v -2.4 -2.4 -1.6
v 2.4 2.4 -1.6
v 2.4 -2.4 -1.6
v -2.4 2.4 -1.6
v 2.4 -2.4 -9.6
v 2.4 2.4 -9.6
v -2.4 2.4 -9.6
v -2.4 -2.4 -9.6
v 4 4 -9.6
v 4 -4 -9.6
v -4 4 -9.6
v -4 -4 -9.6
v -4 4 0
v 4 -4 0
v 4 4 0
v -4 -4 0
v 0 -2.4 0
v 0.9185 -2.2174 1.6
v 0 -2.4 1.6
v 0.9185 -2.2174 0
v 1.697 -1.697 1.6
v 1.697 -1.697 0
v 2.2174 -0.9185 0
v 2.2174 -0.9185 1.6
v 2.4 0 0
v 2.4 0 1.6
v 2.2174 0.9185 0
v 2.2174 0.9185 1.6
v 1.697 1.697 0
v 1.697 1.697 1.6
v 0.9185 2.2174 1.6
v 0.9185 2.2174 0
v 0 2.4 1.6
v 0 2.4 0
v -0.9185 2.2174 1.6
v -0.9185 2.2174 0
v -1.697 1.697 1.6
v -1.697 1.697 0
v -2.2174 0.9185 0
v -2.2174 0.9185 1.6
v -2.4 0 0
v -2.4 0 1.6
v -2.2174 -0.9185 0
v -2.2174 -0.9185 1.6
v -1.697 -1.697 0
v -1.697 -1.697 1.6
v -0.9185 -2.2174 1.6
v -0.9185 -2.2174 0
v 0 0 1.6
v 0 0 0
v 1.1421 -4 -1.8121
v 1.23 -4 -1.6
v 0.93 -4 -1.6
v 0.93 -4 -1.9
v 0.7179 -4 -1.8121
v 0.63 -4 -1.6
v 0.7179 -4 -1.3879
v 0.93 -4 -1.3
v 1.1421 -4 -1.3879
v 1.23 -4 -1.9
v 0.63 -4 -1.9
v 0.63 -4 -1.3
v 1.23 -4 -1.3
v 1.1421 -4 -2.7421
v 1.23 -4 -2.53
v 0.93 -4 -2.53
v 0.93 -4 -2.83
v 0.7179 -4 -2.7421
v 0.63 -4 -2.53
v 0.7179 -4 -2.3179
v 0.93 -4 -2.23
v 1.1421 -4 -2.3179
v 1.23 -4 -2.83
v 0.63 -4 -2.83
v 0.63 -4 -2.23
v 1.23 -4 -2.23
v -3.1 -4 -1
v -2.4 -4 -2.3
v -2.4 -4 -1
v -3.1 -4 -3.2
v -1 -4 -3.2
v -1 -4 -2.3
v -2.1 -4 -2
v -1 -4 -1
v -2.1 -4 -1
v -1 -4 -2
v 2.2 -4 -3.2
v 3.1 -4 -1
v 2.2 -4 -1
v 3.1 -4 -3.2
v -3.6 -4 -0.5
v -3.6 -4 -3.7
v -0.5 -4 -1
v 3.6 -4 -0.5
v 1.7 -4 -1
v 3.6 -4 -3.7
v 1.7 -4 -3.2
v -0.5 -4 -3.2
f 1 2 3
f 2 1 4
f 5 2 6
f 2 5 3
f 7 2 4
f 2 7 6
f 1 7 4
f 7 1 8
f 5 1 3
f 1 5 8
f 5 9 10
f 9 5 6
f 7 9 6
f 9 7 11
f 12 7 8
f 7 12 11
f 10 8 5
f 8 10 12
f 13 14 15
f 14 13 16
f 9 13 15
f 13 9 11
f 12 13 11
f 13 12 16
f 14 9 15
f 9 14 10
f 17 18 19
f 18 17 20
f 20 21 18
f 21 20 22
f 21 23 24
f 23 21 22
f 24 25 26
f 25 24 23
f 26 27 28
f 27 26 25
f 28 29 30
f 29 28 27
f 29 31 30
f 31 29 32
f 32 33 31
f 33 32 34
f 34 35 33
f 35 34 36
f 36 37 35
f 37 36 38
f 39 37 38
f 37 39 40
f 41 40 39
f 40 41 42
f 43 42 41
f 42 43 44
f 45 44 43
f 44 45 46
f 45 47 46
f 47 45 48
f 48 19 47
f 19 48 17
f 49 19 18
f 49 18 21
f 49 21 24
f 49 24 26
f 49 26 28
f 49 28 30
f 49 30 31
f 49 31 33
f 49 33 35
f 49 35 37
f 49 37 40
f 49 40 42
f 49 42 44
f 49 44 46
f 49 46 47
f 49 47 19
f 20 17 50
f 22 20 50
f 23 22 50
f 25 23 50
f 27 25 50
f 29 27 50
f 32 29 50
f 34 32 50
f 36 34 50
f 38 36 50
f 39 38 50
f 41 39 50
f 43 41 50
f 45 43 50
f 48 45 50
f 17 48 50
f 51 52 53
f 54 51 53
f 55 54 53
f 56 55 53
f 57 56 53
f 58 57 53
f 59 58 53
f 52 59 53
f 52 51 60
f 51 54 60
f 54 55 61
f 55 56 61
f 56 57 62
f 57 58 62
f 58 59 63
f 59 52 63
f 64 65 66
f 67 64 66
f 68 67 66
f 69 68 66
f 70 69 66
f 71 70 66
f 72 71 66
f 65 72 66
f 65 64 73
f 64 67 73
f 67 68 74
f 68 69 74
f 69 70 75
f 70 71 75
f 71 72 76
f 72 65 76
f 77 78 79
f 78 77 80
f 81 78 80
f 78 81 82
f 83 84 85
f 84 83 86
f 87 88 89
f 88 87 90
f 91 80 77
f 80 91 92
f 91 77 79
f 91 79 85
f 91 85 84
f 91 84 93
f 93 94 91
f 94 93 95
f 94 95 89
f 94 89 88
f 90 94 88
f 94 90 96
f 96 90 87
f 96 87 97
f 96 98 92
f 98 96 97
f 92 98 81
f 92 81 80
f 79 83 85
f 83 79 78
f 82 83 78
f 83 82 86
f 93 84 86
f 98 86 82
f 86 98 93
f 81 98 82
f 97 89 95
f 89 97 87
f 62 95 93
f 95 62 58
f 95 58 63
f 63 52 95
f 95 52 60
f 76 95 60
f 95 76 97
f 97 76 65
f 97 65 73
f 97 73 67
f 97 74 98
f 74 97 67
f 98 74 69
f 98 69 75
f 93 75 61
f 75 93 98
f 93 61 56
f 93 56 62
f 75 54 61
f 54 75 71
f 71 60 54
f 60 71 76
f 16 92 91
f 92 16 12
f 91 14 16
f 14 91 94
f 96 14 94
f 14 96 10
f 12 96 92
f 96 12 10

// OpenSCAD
// file: ../p/4-4edge.scad
use <../lib.scad>
function ldraw_lib__4_4edge() = [
// 0 Circle 1.0
// 0 Name: 4-4edge.dat
// 0 Author: James Jessiman
// 0 !LDRAW_ORG Primitive UPDATE 2017-01
// 0 !LICENSE Licensed under CC BY 2.0 and CC BY 4.0 : see CAreadme.txt
// 
// 0 BFC CERTIFY CCW
  [0,"BFC","CERTIFY"],
  [0,"BFC","CCW"],
// 
// 0 !HISTORY 1998-12-15 [PTadmin] Official Update 1998-10
// 0 !HISTORY 2005-12-28 [PTadmin] Official Update 2005-01
// 0 !HISTORY 2007-06-24 [PTadmin] Header formatted for Contributor Agreement
// 0 !HISTORY 2008-07-01 [PTadmin] Official Update 2008-01
// 0 !HISTORY 2017-01-15 [Steffen] BFCed
// 0 !HISTORY 2017-12-30 [PTadmin] Official Update 2017-01
// 
// 
// 2 24 1 0 0 0.9239 0 0.3827
  [2,24,1,0,0,0.9239,0,0.3827],
// 2 24 0.9239 0 0.3827 0.7071 0 0.7071
  [2,24,0.9239,0,0.3827,0.7071,0,0.7071],
// 2 24 0.7071 0 0.7071 0.3827 0 0.9239
  [2,24,0.7071,0,0.7071,0.3827,0,0.9239],
// 2 24 0.3827 0 0.9239 0 0 1
  [2,24,0.3827,0,0.9239,0,0,1],
// 2 24 0 0 1 -0.3827 0 0.9239
  [2,24,0,0,1,-0.3827,0,0.9239],
// 2 24 -0.3827 0 0.9239 -0.7071 0 0.7071
  [2,24,-0.3827,0,0.9239,-0.7071,0,0.7071],
// 2 24 -0.7071 0 0.7071 -0.9239 0 0.3827
  [2,24,-0.7071,0,0.7071,-0.9239,0,0.3827],
// 2 24 -0.9239 0 0.3827 -1 0 -0
  [2,24,-0.9239,0,0.3827,-1,0,-0],
// 2 24 -1 0 -0 -0.9239 0 -0.3827
  [2,24,-1,0,-0,-0.9239,0,-0.3827],
// 2 24 -0.9239 0 -0.3827 -0.7071 0 -0.7071
  [2,24,-0.9239,0,-0.3827,-0.7071,0,-0.7071],
// 2 24 -0.7071 0 -0.7071 -0.3827 0 -0.9239
  [2,24,-0.7071,0,-0.7071,-0.3827,0,-0.9239],
// 2 24 -0.3827 0 -0.9239 0 0 -1
  [2,24,-0.3827,0,-0.9239,0,0,-1],
// 2 24 0 0 -1 0.3827 0 -0.9239
  [2,24,0,0,-1,0.3827,0,-0.9239],
// 2 24 0.3827 0 -0.9239 0.7071 0 -0.7071
  [2,24,0.3827,0,-0.9239,0.7071,0,-0.7071],
// 2 24 0.7071 0 -0.7071 0.9239 0 -0.3827
  [2,24,0.7071,0,-0.7071,0.9239,0,-0.3827],
// 2 24 0.9239 0 -0.3827 1 0 0
  [2,24,0.9239,0,-0.3827,1,0,0],
];
module ldraw_lib__4_4edge(step=0, col=false, unit=2/5, alt=false, line=0.2, solid=!$preview)
    makepoly(ldraw_lib__4_4edge(), step=step, col=col, unit=unit, alt=alt, line=line, solid=solid);
ldraw_lib__4_4edge(line=0.2);
// file: ../p/4-4disc.scad
use <../lib.scad>
function ldraw_lib__4_4disc() = [
// 0 Disc 1.0
// 0 Name: 4-4disc.dat
// 0 Author: James Jessiman
// 0 !LDRAW_ORG Primitive UPDATE 2002-02
// 0 !LICENSE Licensed under CC BY 2.0 and CC BY 4.0 : see CAreadme.txt
// 
// 0 BFC CERTIFY CCW
  [0,"BFC","CERTIFY"],
  [0,"BFC","CCW"],
// 
// 0 !HISTORY 1998-12-15 [PTadmin] Official Update 1998-10
// 0 !HISTORY 2002-03-23 [sbliss] Added BFC statement
// 0 !HISTORY 2002-04-25 [PTadmin] Official Update 2002-02
// 0 !HISTORY 2007-06-24 [PTadmin] Header formatted for Contributor Agreement
// 0 !HISTORY 2008-07-01 [PTadmin] Official Update 2008-01
// 
// 
// 3 16 0 0 0 1 0 0 0.9239 0 0.3827
  [3,16,0,0,0,1,0,0,0.9239,0,0.3827],
// 3 16 0 0 0 0.9239 0 0.3827 0.7071 0 0.7071
  [3,16,0,0,0,0.9239,0,0.3827,0.7071,0,0.7071],
// 3 16 0 0 0 0.7071 0 0.7071 0.3827 0 0.9239
  [3,16,0,0,0,0.7071,0,0.7071,0.3827,0,0.9239],
// 3 16 0 0 0 0.3827 0 0.9239 0 0 1
  [3,16,0,0,0,0.3827,0,0.9239,0,0,1],
// 3 16 0 0 0 0 0 1 -0.3827 0 0.9239
  [3,16,0,0,0,0,0,1,-0.3827,0,0.9239],
// 3 16 0 0 0 -0.3827 0 0.9239 -0.7071 0 0.7071
  [3,16,0,0,0,-0.3827,0,0.9239,-0.7071,0,0.7071],
// 3 16 0 0 0 -0.7071 0 0.7071 -0.9239 0 0.3827
  [3,16,0,0,0,-0.7071,0,0.7071,-0.9239,0,0.3827],
// 3 16 0 0 0 -0.9239 0 0.3827 -1 0 -0
  [3,16,0,0,0,-0.9239,0,0.3827,-1,0,-0],
// 3 16 0 0 0 -1 0 -0 -0.9239 0 -0.3827
  [3,16,0,0,0,-1,0,-0,-0.9239,0,-0.3827],
// 3 16 0 0 0 -0.9239 0 -0.3827 -0.7071 0 -0.7071
  [3,16,0,0,0,-0.9239,0,-0.3827,-0.7071,0,-0.7071],
// 3 16 0 0 0 -0.7071 0 -0.7071 -0.3827 0 -0.9239
  [3,16,0,0,0,-0.7071,0,-0.7071,-0.3827,0,-0.9239],
// 3 16 0 0 0 -0.3827 0 -0.9239 0 0 -1
  [3,16,0,0,0,-0.3827,0,-0.9239,0,0,-1],
// 3 16 0 0 0 0 0 -1 0.3827 0 -0.9239
  [3,16,0,0,0,0,0,-1,0.3827,0,-0.9239],
// 3 16 0 0 0 0.3827 0 -0.9239 0.7071 0 -0.7071
  [3,16,0,0,0,0.3827,0,-0.9239,0.7071,0,-0.7071],
// 3 16 0 0 0 0.7071 0 -0.7071 0.9239 0 -0.3827
  [3,16,0,0,0,0.7071,0,-0.7071,0.9239,0,-0.3827],
// 3 16 0 0 0 0.9239 0 -0.3827 1 0 0
  [3,16,0,0,0,0.9239,0,-0.3827,1,0,0],
// 0
];
module ldraw_lib__4_4disc(step=0, col=false, unit=2/5, alt=false, line=0.2, solid=!$preview)
    makepoly(ldraw_lib__4_4disc(), step=step, col=col, unit=unit, alt=alt, line=line, solid=solid);
ldraw_lib__4_4disc(line=0.2);
// file: ../p/4-4cyli.scad
use <../lib.scad>
$fa=1; $fs=0.2;
function ldraw_lib__4_4cyli(realsolid=false) = [
// 0 Cylinder 1.0
// 0 Name: 4-4cyli.dat
// 0 Author: James Jessiman
// 0 !LDRAW_ORG Primitive UPDATE 2005-01
// 0 !LICENSE Licensed under CC BY 2.0 and CC BY 4.0 : see CAreadme.txt
// 
// 0 BFC CERTIFY CCW
  [0,"BFC","CERTIFY"],
  [0,"BFC","CCW"],
// 
// 0 !HISTORY 1998-12-15 [PTadmin] Official Update 1998-10
// 0 !HISTORY 2002-03-23 [sbliss] Added BFC statement; merged headers from files in distributions LDraw 0.27 and Complete.
// 0 !HISTORY 2002-04-25 [PTadmin] Official Update 2002-02
// 0 !HISTORY 2004-12-14 [guyvivan] BFC CCW
// 0 !HISTORY 2005-12-28 [PTadmin] Official Update 2005-01
// 0 !HISTORY 2007-06-24 [PTadmin] Header formatted for Contributor Agreement
// 0 !HISTORY 2008-07-01 [PTadmin] Official Update 2008-01
// 
// 
// 4 16 1 1 0 0.9239 1 0.3827 0.9239 0 0.3827 1 0 0
  [4,16,1,1,0,0.9239,1,0.3827,0.9239,0,0.3827,1,0,0],
// 5 24 1 0 0 1 1 0 0.9239 0 0.3827 0.9239 0 -0.3827
  [5,24,1,0,0,1,1,0,0.9239,0,0.3827,0.9239,0,-0.3827],
// 4 16 0.9239 1 0.3827 0.7071 1 0.7071 0.7071 0 0.7071 0.9239 0 0.3827
  [4,16,0.9239,1,0.3827,0.7071,1,0.7071,0.7071,0,0.7071,0.9239,0,0.3827],
// 5 24 0.9239 0 0.3827 0.9239 1 0.3827 0.7071 0 0.7071 1 0 0
  [5,24,0.9239,0,0.3827,0.9239,1,0.3827,0.7071,0,0.7071,1,0,0],
// 4 16 0.7071 1 0.7071 0.3827 1 0.9239 0.3827 0 0.9239 0.7071 0 0.7071
  [4,16,0.7071,1,0.7071,0.3827,1,0.9239,0.3827,0,0.9239,0.7071,0,0.7071],
// 5 24 0.7071 0 0.7071 0.7071 1 0.7071 0.3827 0 0.9239 0.9239 0 0.3827
  [5,24,0.7071,0,0.7071,0.7071,1,0.7071,0.3827,0,0.9239,0.9239,0,0.3827],
// 4 16 0.3827 1 0.9239 0 1 1 0 0 1 0.3827 0 0.9239
  [4,16,0.3827,1,0.9239,0,1,1,0,0,1,0.3827,0,0.9239],
// 5 24 0.3827 0 0.9239 0.3827 1 0.9239 0 0 1 0.7071 0 0.7071
  [5,24,0.3827,0,0.9239,0.3827,1,0.9239,0,0,1,0.7071,0,0.7071],
// 4 16 0 1 1 -0.3827 1 0.9239 -0.3827 0 0.9239 0 0 1
  [4,16,0,1,1,-0.3827,1,0.9239,-0.3827,0,0.9239,0,0,1],
// 5 24 0 0 1 0 1 1 -0.3827 0 0.9239 0.3827 0 0.9239
  [5,24,0,0,1,0,1,1,-0.3827,0,0.9239,0.3827,0,0.9239],
// 4 16 -0.3827 1 0.9239 -0.7071 1 0.7071 -0.7071 0 0.7071 -0.3827 0 0.9239
  [4,16,-0.3827,1,0.9239,-0.7071,1,0.7071,-0.7071,0,0.7071,-0.3827,0,0.9239],
// 5 24 -0.3827 0 0.9239 -0.3827 1 0.9239 -0.7071 0 0.7071 0 0 1
  [5,24,-0.3827,0,0.9239,-0.3827,1,0.9239,-0.7071,0,0.7071,0,0,1],
// 4 16 -0.7071 1 0.7071 -0.9239 1 0.3827 -0.9239 0 0.3827 -0.7071 0 0.7071
  [4,16,-0.7071,1,0.7071,-0.9239,1,0.3827,-0.9239,0,0.3827,-0.7071,0,0.7071],
// 5 24 -0.7071 0 0.7071 -0.7071 1 0.7071 -0.9239 0 0.3827 -0.3827 0 0.9239
  [5,24,-0.7071,0,0.7071,-0.7071,1,0.7071,-0.9239,0,0.3827,-0.3827,0,0.9239],
// 4 16 -0.9239 1 0.3827 -1 1 0 -1 0 0 -0.9239 0 0.3827
  [4,16,-0.9239,1,0.3827,-1,1,0,-1,0,0,-0.9239,0,0.3827],
// 5 24 -0.9239 0 0.3827 -0.9239 1 0.3827 -1 0 0 -0.7071 0 0.7071
  [5,24,-0.9239,0,0.3827,-0.9239,1,0.3827,-1,0,0,-0.7071,0,0.7071],
// 4 16 -1 1 0 -0.9239 1 -0.3827 -0.9239 0 -0.3827 -1 0 0
  [4,16,-1,1,0,-0.9239,1,-0.3827,-0.9239,0,-0.3827,-1,0,0],
// 5 24 -1 0 0 -1 1 0 -0.9239 0 -0.3827 -0.9239 0 0.3827
  [5,24,-1,0,0,-1,1,0,-0.9239,0,-0.3827,-0.9239,0,0.3827],
// 4 16 -0.9239 1 -0.3827 -0.7071 1 -0.7071 -0.7071 0 -0.7071 -0.9239 0 -0.3827
  [4,16,-0.9239,1,-0.3827,-0.7071,1,-0.7071,-0.7071,0,-0.7071,-0.9239,0,-0.3827],
// 5 24 -0.9239 0 -0.3827 -0.9239 1 -0.3827 -0.7071 0 -0.7071 -1 0 0
  [5,24,-0.9239,0,-0.3827,-0.9239,1,-0.3827,-0.7071,0,-0.7071,-1,0,0],
// 4 16 -0.7071 1 -0.7071 -0.3827 1 -0.9239 -0.3827 0 -0.9239 -0.7071 0 -0.7071
  [4,16,-0.7071,1,-0.7071,-0.3827,1,-0.9239,-0.3827,0,-0.9239,-0.7071,0,-0.7071],
// 5 24 -0.7071 0 -0.7071 -0.7071 1 -0.7071 -0.3827 0 -0.9239 -0.9239 0 -0.3827
  [5,24,-0.7071,0,-0.7071,-0.7071,1,-0.7071,-0.3827,0,-0.9239,-0.9239,0,-0.3827],
// 4 16 -0.3827 1 -0.9239 0 1 -1 0 0 -1 -0.3827 0 -0.9239
  [4,16,-0.3827,1,-0.9239,0,1,-1,0,0,-1,-0.3827,0,-0.9239],
// 5 24 -0.3827 0 -0.9239 -0.3827 1 -0.9239 0 0 -1 -0.7071 0 -0.7071
  [5,24,-0.3827,0,-0.9239,-0.3827,1,-0.9239,0,0,-1,-0.7071,0,-0.7071],
// 4 16 0 1 -1 0.3827 1 -0.9239 0.3827 0 -0.9239 0 0 -1
  [4,16,0,1,-1,0.3827,1,-0.9239,0.3827,0,-0.9239,0,0,-1],
// 5 24 0 0 -1 0 1 -1 0.3827 0 -0.9239 -0.3827 0 -0.9239
  [5,24,0,0,-1,0,1,-1,0.3827,0,-0.9239,-0.3827,0,-0.9239],
// 4 16 0.3827 1 -0.9239 0.7071 1 -0.7071 0.7071 0 -0.7071 0.3827 0 -0.9239
  [4,16,0.3827,1,-0.9239,0.7071,1,-0.7071,0.7071,0,-0.7071,0.3827,0,-0.9239],
// 5 24 0.3827 0 -0.9239 0.3827 1 -0.9239 0.7071 0 -0.7071 0 0 -1
  [5,24,0.3827,0,-0.9239,0.3827,1,-0.9239,0.7071,0,-0.7071,0,0,-1],
// 4 16 0.7071 1 -0.7071 0.9239 1 -0.3827 0.9239 0 -0.3827 0.7071 0 -0.7071
  [4,16,0.7071,1,-0.7071,0.9239,1,-0.3827,0.9239,0,-0.3827,0.7071,0,-0.7071],
// 5 24 0.7071 0 -0.7071 0.7071 1 -0.7071 0.9239 0 -0.3827 0.3827 0 -0.9239
  [5,24,0.7071,0,-0.7071,0.7071,1,-0.7071,0.9239,0,-0.3827,0.3827,0,-0.9239],
// 4 16 0.9239 1 -0.3827 1 1 0 1 0 0 0.9239 0 -0.3827
  [4,16,0.9239,1,-0.3827,1,1,0,1,0,0,0.9239,0,-0.3827],
// 5 24 0.9239 0 -0.3827 0.9239 1 -0.3827 1 0 0 0.7071 0 -0.7071
  [5,24,0.9239,0,-0.3827,0.9239,1,-0.3827,1,0,0,0.7071,0,-0.7071],
// 0
];
module ldraw_lib__4_4cyli(step=0, col=false, unit=2/5, alt=false, line=0.2, solid=!$preview)
    makepoly(ldraw_lib__4_4cyli(solid), step=step, col=col, unit=unit, alt=alt, line=line, solid=solid);
ldraw_lib__4_4cyli(line=0.2);
// file: ../p/stud.scad
use <../lib.scad>
use <4-4cyli.scad>
use <4-4disc.scad>
use <4-4edge.scad>
function ldraw_lib__stud() = [
// 0 Stud
// 0 Name: stud.dat
// 0 Author: James Jessiman
// 0 !LDRAW_ORG Primitive UPDATE 2012-01
// 0 !LICENSE Licensed under CC BY 4.0 : see CAreadme.txt
// 
// 0 BFC CERTIFY CCW
  [0,"BFC","CERTIFY"],
  [0,"BFC","CCW"],
// 
// 0 !HISTORY 2002-04-04 [sbliss] Modified for BFC compliance
// 0 !HISTORY 2002-04-25 [PTadmin] Official Update 2002-02
// 0 !HISTORY 2007-06-24 [PTadmin] Header formatted for Contributor Agreement
// 0 !HISTORY 2008-07-01 [PTadmin] Official Update 2008-01
// 0 !HISTORY 2012-02-16 [Philo] Changed to CCW
// 0 !HISTORY 2012-03-30 [PTadmin] Official Update 2012-01
// 
// 
// 1 16 0 0 0 6 0 0 0 1 0 0 0 6 4-4edge.dat
  [1,16,0,0,0,6,0,0,0,1,0,0,0,6, ldraw_lib__4_4edge()],
// 1 16 0 -4 0 6 0 0 0 1 0 0 0 6 4-4edge.dat
  [1,16,0,-4,0,6,0,0,0,1,0,0,0,6, ldraw_lib__4_4edge()],
// 1 16 0 0 0 6 0 0 0 -4 0 0 0 6 4-4cyli.dat
  [1,16,0,0,0,6,0,0,0,-4,0,0,0,6, ldraw_lib__4_4cyli()],
// 1 16 0 -4 0 6 0 0 0 1 0 0 0 6 4-4disc.dat
  [1,16,0,-4,0,6,0,0,0,1,0,0,0,6, ldraw_lib__4_4disc()],
  [-1,16,0,0,0,6,0,0,0,-1,0,0,0,6, ldraw_lib__4_4disc()],
];
module ldraw_lib__stud(step=0, col=false, unit=2/5, alt=false, line=0.2, solid=!$preview)
    makepoly(ldraw_lib__stud(), step=step, col=col, unit=unit, alt=alt, line=line, solid=solid);
ldraw_lib__stud(line=0.2);
// file: ../p/box5.scad
use <../lib.scad>
function ldraw_lib__box5() = [
// 0 Box with 5 Faces and All Edges
// 0 Name: box5.dat
// 0 Author: James Jessiman
// 0 !LDRAW_ORG Primitive UPDATE 2012-01
// 0 !LICENSE Licensed under CC BY 2.0 and CC BY 4.0 : see CAreadme.txt
// 
// 0 BFC CERTIFY CCW
  [0,"BFC","CERTIFY"],
  [0,"BFC","CCW"],
// 
// 0 !HISTORY 2002-04-03 [sbliss] Modified for BFC compliance
// 0 !HISTORY 2002-04-25 [PTadmin] Official Update 2002-02
// 0 !HISTORY 2007-06-24 [PTadmin] Header formatted for Contributor Agreement
// 0 !HISTORY 2008-07-01 [PTadmin] Official Update 2008-01
// 0 !HISTORY 2012-02-16 [Philo] Changed to CCW
// 0 !HISTORY 2012-03-30 [PTadmin] Official Update 2012-01
// 
// 
// 2 24 1 1 1 -1 1 1
  [2,24,1,1,1,-1,1,1],
// 2 24 -1 1 1 -1 1 -1
  [2,24,-1,1,1,-1,1,-1],
// 2 24 -1 1 -1 1 1 -1
  [2,24,-1,1,-1,1,1,-1],
// 2 24 1 1 -1 1 1 1
  [2,24,1,1,-1,1,1,1],
// 2 24 1 0 1 -1 0 1
  [2,24,1,0,1,-1,0,1],
// 2 24 -1 0 1 -1 0 -1
  [2,24,-1,0,1,-1,0,-1],
// 2 24 -1 0 -1 1 0 -1
  [2,24,-1,0,-1,1,0,-1],
// 2 24 1 0 -1 1 0 1
  [2,24,1,0,-1,1,0,1],
// 2 24 1 0 1 1 1 1
  [2,24,1,0,1,1,1,1],
// 2 24 -1 0 1 -1 1 1
  [2,24,-1,0,1,-1,1,1],
// 2 24 1 0 -1 1 1 -1
  [2,24,1,0,-1,1,1,-1],
// 2 24 -1 0 -1 -1 1 -1
  [2,24,-1,0,-1,-1,1,-1],
// 4 16 -1 1 1 1 1 1 1 1 -1 -1 1 -1
  [4,16,-1,1,1,1,1,1,1,1,-1,-1,1,-1],
// 4 16 -1 1 1 -1 0 1 1 0 1 1 1 1
  [4,16,-1,1,1,-1,0,1,1,0,1,1,1,1],
// 4 16 -1 1 -1 -1 0 -1 -1 0 1 -1 1 1
  [4,16,-1,1,-1,-1,0,-1,-1,0,1,-1,1,1],
// 4 16 1 1 -1 1 0 -1 -1 0 -1 -1 1 -1
  [4,16,1,1,-1,1,0,-1,-1,0,-1,-1,1,-1],
// 4 16 1 1 1 1 0 1 1 0 -1 1 1 -1
  [4,16,1,1,1,1,0,1,1,0,-1,1,1,-1],
];
makepoly(ldraw_lib__box5(), line=0.2);
// file: ../p/box4t.scad
use <../lib.scad>
function ldraw_lib__box4t() = [
// 0 Box with 4 Adjacent Faces and All Edges
// 0 Name: box4t.dat
// 0 Author: Tore Eriksson [Tore_Eriksson]
// 0 !LDRAW_ORG Primitive UPDATE 2003-02
// 0 !LICENSE Licensed under CC BY 2.0 and CC BY 4.0 : see CAreadme.txt
// 
// 0 BFC CERTIFY CCW
  [0,"BFC","CERTIFY"],
  [0,"BFC","CCW"],
// 
// 0 !HISTORY 1997-09-29 [PTadmin] Official Update 1997-15
// 0 !HISTORY 2002-08-31 [izanette] Modified with WINDZ for BFC compliance
// 0 !HISTORY 2003-08-01 [PTadmin] Official Update 2003-02
// 0 !HISTORY 2007-06-24 [PTadmin] Header formatted for Contributor Agreement
// 0 !HISTORY 2008-07-01 [PTadmin] Official Update 2008-01
// 
// 
// 2 24 1 1 1 -1 1 1
  [2,24,1,1,1,-1,1,1],
// 2 24 -1 1 1 -1 1 -1
  [2,24,-1,1,1,-1,1,-1],
// 2 24 -1 1 -1 1 1 -1
  [2,24,-1,1,-1,1,1,-1],
// 2 24 1 1 -1 1 1 1
  [2,24,1,1,-1,1,1,1],
// 2 24 1 0 1 -1 0 1
  [2,24,1,0,1,-1,0,1],
// 2 24 -1 0 1 -1 0 -1
  [2,24,-1,0,1,-1,0,-1],
// 2 24 -1 0 -1 1 0 -1
  [2,24,-1,0,-1,1,0,-1],
// 2 24 1 0 -1 1 0 1
  [2,24,1,0,-1,1,0,1],
// 2 24 1 0 1 1 1 1
  [2,24,1,0,1,1,1,1],
// 2 24 -1 0 1 -1 1 1
  [2,24,-1,0,1,-1,1,1],
// 2 24 1 0 -1 1 1 -1
  [2,24,1,0,-1,1,1,-1],
// 2 24 -1 0 -1 -1 1 -1
  [2,24,-1,0,-1,-1,1,-1],
// 4 16 1 1 1 1 1 -1 -1 1 -1 -1 1 1
  [4,16,1,1,1,1,1,-1,-1,1,-1,-1,1,1],
// 4 16 1 1 1 -1 1 1 -1 0 1 1 0 1
  [4,16,1,1,1,-1,1,1,-1,0,1,1,0,1],
// 4 16 -1 1 1 -1 1 -1 -1 0 -1 -1 0 1
  [4,16,-1,1,1,-1,1,-1,-1,0,-1,-1,0,1],
// 0 4 16 -1 1 -1 -1 0 -1 1 0 -1 1 1 -1
// 4 16 1 1 -1 1 1 1 1 0 1 1 0 -1
  [4,16,1,1,-1,1,1,1,1,0,1,1,0,-1],
// 0
];
makepoly(ldraw_lib__box4t(), line=0.2);
// file: s/3005s01.scad
use <../../lib.scad>
use <../../p/box4t.scad>
use <../../p/box5.scad>
use <../../p/stud.scad>
function ldraw_lib__s__3005s01() = [
// 0 ~Brick  1 x  1 without Front Face
// 0 Name: s\3005s01.dat
// 0 Author: John Riley [jriley]
// 0 !LDRAW_ORG Subpart UPDATE 2004-01
// 0 !LICENSE Licensed under CC BY 2.0 and CC BY 4.0 : see CAreadme.txt
// 
// 0 BFC CERTIFY CCW
  [0,"BFC","CERTIFY"],
  [0,"BFC","CCW"],
// 
// 0 !HISTORY 2003-09-07 [jriley] BFCed & Subfiled
// 0 !HISTORY 2004-03-02 [PTadmin] Official Update 2004-01
// 0 !HISTORY 2007-08-29 [PTadmin] Header formatted for Contributor Agreement
// 0 !HISTORY 2008-07-01 [PTadmin] Official Update 2008-01
// 
// 
// 0 BFC INVERTNEXT
  [0,"BFC","INVERTNEXT"],
// 1 16 0 24 0 0 0 6 0 -20 0 -6 0 0 box5.dat
  [1,16,0,24,0,0,0,6,0,-20,0,-6,0,0, ldraw_lib__box5()],
// 4 16 10 24 -10 6 24 -6 6 24 6 10 24 10
  [4,16,10,24,-10,6,24,-6,6,24,6,10,24,10],
// 4 16 10 24 10 6 24 6 -6 24 6 -10 24 10
  [4,16,10,24,10,6,24,6,-6,24,6,-10,24,10],
// 4 16 -10 24 10 -6 24 6 -6 24 -6 -10 24 -10
  [4,16,-10,24,10,-6,24,6,-6,24,-6,-10,24,-10],
// 4 16 -10 24 -10 -6 24 -6 6 24 -6 10 24 -10
  [4,16,-10,24,-10,-6,24,-6,6,24,-6,10,24,-10],
// 1 16 0 24 0 10 0 0 0 -24 0 0 0 10 box4t.dat
  [1,16,0,24,0,10,0,0,0,-24,0,0,0,10, ldraw_lib__box4t()],
// 1 16 0 0 0 0 0 1 0 1 0 -1 0 0 stud.dat
  [1,16,0,0,0,0,0,1,0,1,0,-1,0,0, ldraw_lib__stud()],
// 0
];
module ldraw_lib__s__3005s01(step=0, col=false, unit=2/5, alt=false, line=0.2, solid=!$preview)
    makepoly(ldraw_lib__s__3005s01(), step=step, col=col, unit=unit, alt=alt, line=line, solid=solid);
ldraw_lib__s__3005s01(line=0.2);
// file: ../p/8/4-4ndis.scad
use <../../lib.scad>
$fa=1; $fs=0.2;
function ldraw_lib__8__4_4ndis(realsolid=false) = [
// 0 Lo-Res Disc Negative 1.0
// 0 Name: 8\4-4ndis.dat
// 0 Author: Magnus Forsberg [MagFors]
// 0 !LDRAW_ORG 8_Primitive UPDATE 2019-02
// 0 !LICENSE Licensed under CC BY 2.0 and CC BY 4.0 : see CAreadme.txt
// 
// 0 BFC CERTIFY CCW
  [0,"BFC","CERTIFY"],
  [0,"BFC","CCW"],
// 
// 0 !HISTORY 2019-09-09 [PTadmin] Official Update 2019-02
// 
// 
// 3 16 1 0 1 0.7071 0 0.7071 1 0 0
  [3,16,1,0,1,0.7071,0,0.7071,1,0,0],
// 3 16 1 0 1 0 0 1 0.7071 0 0.7071
  [3,16,1,0,1,0,0,1,0.7071,0,0.7071],
// 3 16 -1 0 1 -0.7071 0 0.7071 0 0 1
  [3,16,-1,0,1,-0.7071,0,0.7071,0,0,1],
// 3 16 -1 0 1 -1 0 0 -0.7071 0 0.7071
  [3,16,-1,0,1,-1,0,0,-0.7071,0,0.7071],
// 3 16 -1 0 -1 -0.7071 0 -0.7071 -1 0 0
  [3,16,-1,0,-1,-0.7071,0,-0.7071,-1,0,0],
// 3 16 -1 0 -1 0 0 -1 -0.7071 0 -0.7071
  [3,16,-1,0,-1,0,0,-1,-0.7071,0,-0.7071],
// 3 16 1 0 -1 0.7071 0 -0.7071 0 0 -1
  [3,16,1,0,-1,0.7071,0,-0.7071,0,0,-1],
// 3 16 1 0 -1 1 0 0 0.7071 0 -0.7071
  [3,16,1,0,-1,1,0,0,0.7071,0,-0.7071],
// 0 // Build by Primitive Generator 2
];
module ldraw_lib__8__4_4ndis(step=0, col=false, unit=2/5, alt=false, line=0.2, solid=!$preview)
    makepoly(ldraw_lib__8__4_4ndis(solid), step=step, col=col, unit=unit, alt=alt, line=line, solid=solid);
ldraw_lib__8__4_4ndis(line=0.2);
// file: ../p/8/4-4disc.scad
use <../../lib.scad>
function ldraw_lib__8__4_4disc() = [
// 0 Disc 1.0
// 0 Name: 8\4-4disc.dat
// 0 Author: Philippe Hurbain [Philo]
// 0 !LDRAW_ORG 8_Primitive UPDATE 2016-01
// 0 !LICENSE Licensed under CC BY 2.0 and CC BY 4.0 : see CAreadme.txt
// 
// 0 BFC CERTIFY CCW
  [0,"BFC","CERTIFY"],
  [0,"BFC","CCW"],
// 
// 0 !HISTORY 2016-12-31 [PTadmin] Official Update 2016-01
// 
// 
// 3 16 0 0 0 1 0 0 0.7071 0 0.7071
  [3,16,0,0,0,1,0,0,0.7071,0,0.7071],
// 3 16 0 0 0 0.7071 0 0.7071 0 0 1
  [3,16,0,0,0,0.7071,0,0.7071,0,0,1],
// 3 16 0 0 0 0 0 1 -0.7071 0 0.7071
  [3,16,0,0,0,0,0,1,-0.7071,0,0.7071],
// 3 16 0 0 0 -0.7071 0 0.7071 -1 0 0
  [3,16,0,0,0,-0.7071,0,0.7071,-1,0,0],
// 3 16 0 0 0 -1 0 0 -0.7071 0 -0.7071
  [3,16,0,0,0,-1,0,0,-0.7071,0,-0.7071],
// 3 16 0 0 0 -0.7071 0 -0.7071 0 0 -1
  [3,16,0,0,0,-0.7071,0,-0.7071,0,0,-1],
// 3 16 0 0 0 0 0 -1 0.7071 0 -0.7071
  [3,16,0,0,0,0,0,-1,0.7071,0,-0.7071],
// 3 16 0 0 0 0.7071 0 -0.7071 1 0 0
  [3,16,0,0,0,0.7071,0,-0.7071,1,0,0],
// 0 // Build by Primitive Generator 2
];
module ldraw_lib__8__4_4disc(step=0, col=false, unit=2/5, alt=false, line=0.2, solid=!$preview)
    makepoly(ldraw_lib__8__4_4disc(), step=step, col=col, unit=unit, alt=alt, line=line, solid=solid);
ldraw_lib__8__4_4disc(line=0.2);
// main file
use <../lib.scad>
use <../p/8/4-4disc.scad>
use <../p/8/4-4ndis.scad>
use <s/3005s01.scad>
function ldraw_lib__3005pz2() = [
// 0 Brick  1 x  1 with Metallic Silver Boxes and 2 Red Dots on Black Background Pattern
// 0 Name: 3005pz2.dat
// 0 Author: Vincent Messenet [Cheenzo]
// 0 !LDRAW_ORG Part UPDATE 2020-02
// 0 !LICENSE Licensed under CC BY 4.0 : see CAreadme.txt
// 
// 0 BFC CERTIFY CCW
  [0,"BFC","CERTIFY"],
  [0,"BFC","CCW"],
// 
// 0 !KEYWORDS Brickheadz, BrickLink 3005pb029, Han Solo, Rebrickable 3005pr0015
// 0 !KEYWORDS Set 41608, Star Wars
// 
// 0 !HISTORY 2020-09-05 [PTadmin] Official Update 2020-02
// 
// 
// 1 16 0 0 0 1 0 0 0 1 0 0 0 1 s\3005s01.dat
  [1,16,0,0,0,1,0,0,0,1,0,0,0,1, ldraw_lib__s__3005s01()],
// 
// 1 4 2.325 4 -10 .75 0 0 0 0 .75 0 1 0 8\4-4disc.dat
  [1,4,2.325,4,-10,.75,0,0,0,0,.75,0,1,0, ldraw_lib__8__4_4disc()],
// 1 16 2.325 4 -10 .75 0 0 0 0 .75 0 1 0 8\4-4ndis.dat
  [1,16,2.325,4,-10,.75,0,0,0,0,.75,0,1,0, ldraw_lib__8__4_4ndis()],
// 1 4 2.325 6.325 -10 .75 0 0 0 0 .75 0 1 0 8\4-4disc.dat
  [1,4,2.325,6.325,-10,.75,0,0,0,0,.75,0,1,0, ldraw_lib__8__4_4disc()],
// 1 16 2.325 6.325 -10 .75 0 0 0 0 .75 0 1 0 8\4-4ndis.dat
  [1,16,2.325,6.325,-10,.75,0,0,0,0,.75,0,1,0, ldraw_lib__8__4_4ndis()],
// 4 80 -6 5.75 -10 -6 2.5 -10 -7.75 2.5 -10 -7.75 8 -10
  [4,80,-6,5.75,-10,-6,2.5,-10,-7.75,2.5,-10,-7.75,8,-10],
// 4 80 -6 5.75 -10 -7.75 8 -10 -2.5 8 -10 -2.5 5.75 -10
  [4,80,-6,5.75,-10,-7.75,8,-10,-2.5,8,-10,-2.5,5.75,-10],
// 4 80 -5.25 2.5 -10 -5.25 5 -10 -2.5 5 -10 -2.5 2.5 -10
  [4,80,-5.25,2.5,-10,-5.25,5,-10,-2.5,5,-10,-2.5,2.5,-10],
// 4 80 7.75 8 -10 7.75 2.5 -10 5.5 2.5 -10 5.5 8 -10
  [4,80,7.75,8,-10,7.75,2.5,-10,5.5,2.5,-10,5.5,8,-10],
// 4 0 -7.75 8 -10 -7.75 2.5 -10 -9 1.25 -10 -9 9.25 -10
  [4,0,-7.75,8,-10,-7.75,2.5,-10,-9,1.25,-10,-9,9.25,-10],
// 3 0 -9 1.25 -10 -7.75 2.5 -10 -6 2.5 -10
  [3,0,-9,1.25,-10,-7.75,2.5,-10,-6,2.5,-10],
// 3 0 -9 1.25 -10 -6 2.5 -10 -5.25 2.5 -10
  [3,0,-9,1.25,-10,-6,2.5,-10,-5.25,2.5,-10],
// 3 0 -9 1.25 -10 -5.25 2.5 -10 -2.5 2.5 -10
  [3,0,-9,1.25,-10,-5.25,2.5,-10,-2.5,2.5,-10],
// 3 0 -9 1.25 -10 -2.5 2.5 -10 -1.25 2.5 -10
  [3,0,-9,1.25,-10,-2.5,2.5,-10,-1.25,2.5,-10],
// 4 0 -9 1.25 -10 -1.25 2.5 -10 4.25 2.5 -10 9 1.25 -10
  [4,0,-9,1.25,-10,-1.25,2.5,-10,4.25,2.5,-10,9,1.25,-10],
// 3 0 9 1.25 -10 4.25 2.5 -10 5.5 2.5 -10
  [3,0,9,1.25,-10,4.25,2.5,-10,5.5,2.5,-10],
// 3 0 9 1.25 -10 5.5 2.5 -10 7.75 2.5 -10
  [3,0,9,1.25,-10,5.5,2.5,-10,7.75,2.5,-10],
// 4 0 9 1.25 -10 7.75 2.5 -10 7.75 8 -10 9 9.25 -10
  [4,0,9,1.25,-10,7.75,2.5,-10,7.75,8,-10,9,9.25,-10],
// 3 0 9 9.25 -10 7.75 8 -10 5.5 8 -10
  [3,0,9,9.25,-10,7.75,8,-10,5.5,8,-10],
// 3 0 9 9.25 -10 5.5 8 -10 4.25 8 -10
  [3,0,9,9.25,-10,5.5,8,-10,4.25,8,-10],
// 4 0 9 9.25 -10 4.25 8 -10 -1.25 8 -10 -9 9.25 -10
  [4,0,9,9.25,-10,4.25,8,-10,-1.25,8,-10,-9,9.25,-10],
// 3 0 -9 9.25 -10 -1.25 8 -10 -2.5 8 -10
  [3,0,-9,9.25,-10,-1.25,8,-10,-2.5,8,-10],
// 3 0 -9 9.25 -10 -2.5 8 -10 -7.75 8 -10
  [3,0,-9,9.25,-10,-2.5,8,-10,-7.75,8,-10],
// 4 0 -5.25 5 -10 -5.25 2.5 -10 -6 2.5 -10 -6 5.75 -10
  [4,0,-5.25,5,-10,-5.25,2.5,-10,-6,2.5,-10,-6,5.75,-10],
// 4 0 -2.5 5 -10 -5.25 5 -10 -6 5.75 -10 -2.5 5.75 -10
  [4,0,-2.5,5,-10,-5.25,5,-10,-6,5.75,-10,-2.5,5.75,-10],
// 3 0 -1.25 2.5 -10 -2.5 2.5 -10 -2.5 5 -10
  [3,0,-1.25,2.5,-10,-2.5,2.5,-10,-2.5,5,-10],
// 4 0 -1.25 2.5 -10 -2.5 5 -10 -2.5 5.75 -10 -1.25 8 -10
  [4,0,-1.25,2.5,-10,-2.5,5,-10,-2.5,5.75,-10,-1.25,8,-10],
// 3 0 -2.5 8 -10 -1.25 8 -10 -2.5 5.75 -10
  [3,0,-2.5,8,-10,-1.25,8,-10,-2.5,5.75,-10],
// 4 0 5.5 8 -10 5.5 2.5 -10 4.25 2.5 -10 4.25 8 -10
  [4,0,5.5,8,-10,5.5,2.5,-10,4.25,2.5,-10,4.25,8,-10],
// 4 16 -1.25 2.5 -10 1.575 3.25 -10 2.325 3.25 -10 4.25 2.5 -10
  [4,16,-1.25,2.5,-10,1.575,3.25,-10,2.325,3.25,-10,4.25,2.5,-10],
// 3 16 4.25 2.5 -10 2.325 3.25 -10 3.075 3.25 -10
  [3,16,4.25,2.5,-10,2.325,3.25,-10,3.075,3.25,-10],
// 3 16 3.075 3.25 -10 3.075 4 -10 4.25 2.5 -10
  [3,16,3.075,3.25,-10,3.075,4,-10,4.25,2.5,-10],
// 3 16 4.25 2.5 -10 3.075 4 -10 3.075 4.75 -10
  [3,16,4.25,2.5,-10,3.075,4,-10,3.075,4.75,-10],
// 4 16 4.25 2.5 -10 3.075 4.75 -10 3.075 5.575 -10 4.25 8 -10
  [4,16,4.25,2.5,-10,3.075,4.75,-10,3.075,5.575,-10,4.25,8,-10],
// 3 16 4.25 8 -10 3.075 5.575 -10 3.075 6.325 -10
  [3,16,4.25,8,-10,3.075,5.575,-10,3.075,6.325,-10],
// 3 16 4.25 8 -10 3.075 6.325 -10 3.075 7.075 -10
  [3,16,4.25,8,-10,3.075,6.325,-10,3.075,7.075,-10],
// 3 16 4.25 8 -10 3.075 7.075 -10 2.325 7.075 -10
  [3,16,4.25,8,-10,3.075,7.075,-10,2.325,7.075,-10],
// 4 16 4.25 8 -10 2.325 7.075 -10 1.575 7.075 -10 -1.25 8 -10
  [4,16,4.25,8,-10,2.325,7.075,-10,1.575,7.075,-10,-1.25,8,-10],
// 3 16 -1.25 8 -10 1.575 7.075 -10 1.575 6.325 -10
  [3,16,-1.25,8,-10,1.575,7.075,-10,1.575,6.325,-10],
// 3 16 -1.25 8 -10 1.575 6.325 -10 1.575 5.575 -10
  [3,16,-1.25,8,-10,1.575,6.325,-10,1.575,5.575,-10],
// 4 16 -1.25 8 -10 1.575 5.575 -10 1.575 4.75 -10 -1.25 2.5 -10
  [4,16,-1.25,8,-10,1.575,5.575,-10,1.575,4.75,-10,-1.25,2.5,-10],
// 3 16 -1.25 2.5 -10 1.575 4.75 -10 1.575 4 -10
  [3,16,-1.25,2.5,-10,1.575,4.75,-10,1.575,4,-10],
// 3 16 -1.25 2.5 -10 1.575 4 -10 1.575 3.25 -10
  [3,16,-1.25,2.5,-10,1.575,4,-10,1.575,3.25,-10],
// 4 16 1.575 4.75 -10 1.575 5.575 -10 2.325 5.575 -10 2.325 4.75 -10
  [4,16,1.575,4.75,-10,1.575,5.575,-10,2.325,5.575,-10,2.325,4.75,-10],
// 4 16 2.325 4.75 -10 2.325 5.575 -10 3.075 5.575 -10 3.075 4.75 -10
  [4,16,2.325,4.75,-10,2.325,5.575,-10,3.075,5.575,-10,3.075,4.75,-10],
// 4 16 -9 9.25 -10 -9 1.25 -10 -10 0 -10 -10 24 -10
  [4,16,-9,9.25,-10,-9,1.25,-10,-10,0,-10,-10,24,-10],
// 4 16 -9 1.25 -10 9 1.25 -10 10 0 -10 -10 0 -10
  [4,16,-9,1.25,-10,9,1.25,-10,10,0,-10,-10,0,-10],
// 4 16 10 0 -10 9 1.25 -10 9 9.25 -10 10 24 -10
  [4,16,10,0,-10,9,1.25,-10,9,9.25,-10,10,24,-10],
// 4 16 10 24 -10 9 9.25 -10 -9 9.25 -10 -10 24 -10
  [4,16,10,24,-10,9,9.25,-10,-9,9.25,-10,-10,24,-10],
];
module ldraw_lib__3005pz2(step=0, col=false, unit=2/5, alt=false, line=0.2, solid=!$preview)
    makepoly(ldraw_lib__3005pz2(), step=step, col=col, unit=unit, alt=alt, line=line, solid=solid);
ldraw_lib__3005pz2(line=0.2);
